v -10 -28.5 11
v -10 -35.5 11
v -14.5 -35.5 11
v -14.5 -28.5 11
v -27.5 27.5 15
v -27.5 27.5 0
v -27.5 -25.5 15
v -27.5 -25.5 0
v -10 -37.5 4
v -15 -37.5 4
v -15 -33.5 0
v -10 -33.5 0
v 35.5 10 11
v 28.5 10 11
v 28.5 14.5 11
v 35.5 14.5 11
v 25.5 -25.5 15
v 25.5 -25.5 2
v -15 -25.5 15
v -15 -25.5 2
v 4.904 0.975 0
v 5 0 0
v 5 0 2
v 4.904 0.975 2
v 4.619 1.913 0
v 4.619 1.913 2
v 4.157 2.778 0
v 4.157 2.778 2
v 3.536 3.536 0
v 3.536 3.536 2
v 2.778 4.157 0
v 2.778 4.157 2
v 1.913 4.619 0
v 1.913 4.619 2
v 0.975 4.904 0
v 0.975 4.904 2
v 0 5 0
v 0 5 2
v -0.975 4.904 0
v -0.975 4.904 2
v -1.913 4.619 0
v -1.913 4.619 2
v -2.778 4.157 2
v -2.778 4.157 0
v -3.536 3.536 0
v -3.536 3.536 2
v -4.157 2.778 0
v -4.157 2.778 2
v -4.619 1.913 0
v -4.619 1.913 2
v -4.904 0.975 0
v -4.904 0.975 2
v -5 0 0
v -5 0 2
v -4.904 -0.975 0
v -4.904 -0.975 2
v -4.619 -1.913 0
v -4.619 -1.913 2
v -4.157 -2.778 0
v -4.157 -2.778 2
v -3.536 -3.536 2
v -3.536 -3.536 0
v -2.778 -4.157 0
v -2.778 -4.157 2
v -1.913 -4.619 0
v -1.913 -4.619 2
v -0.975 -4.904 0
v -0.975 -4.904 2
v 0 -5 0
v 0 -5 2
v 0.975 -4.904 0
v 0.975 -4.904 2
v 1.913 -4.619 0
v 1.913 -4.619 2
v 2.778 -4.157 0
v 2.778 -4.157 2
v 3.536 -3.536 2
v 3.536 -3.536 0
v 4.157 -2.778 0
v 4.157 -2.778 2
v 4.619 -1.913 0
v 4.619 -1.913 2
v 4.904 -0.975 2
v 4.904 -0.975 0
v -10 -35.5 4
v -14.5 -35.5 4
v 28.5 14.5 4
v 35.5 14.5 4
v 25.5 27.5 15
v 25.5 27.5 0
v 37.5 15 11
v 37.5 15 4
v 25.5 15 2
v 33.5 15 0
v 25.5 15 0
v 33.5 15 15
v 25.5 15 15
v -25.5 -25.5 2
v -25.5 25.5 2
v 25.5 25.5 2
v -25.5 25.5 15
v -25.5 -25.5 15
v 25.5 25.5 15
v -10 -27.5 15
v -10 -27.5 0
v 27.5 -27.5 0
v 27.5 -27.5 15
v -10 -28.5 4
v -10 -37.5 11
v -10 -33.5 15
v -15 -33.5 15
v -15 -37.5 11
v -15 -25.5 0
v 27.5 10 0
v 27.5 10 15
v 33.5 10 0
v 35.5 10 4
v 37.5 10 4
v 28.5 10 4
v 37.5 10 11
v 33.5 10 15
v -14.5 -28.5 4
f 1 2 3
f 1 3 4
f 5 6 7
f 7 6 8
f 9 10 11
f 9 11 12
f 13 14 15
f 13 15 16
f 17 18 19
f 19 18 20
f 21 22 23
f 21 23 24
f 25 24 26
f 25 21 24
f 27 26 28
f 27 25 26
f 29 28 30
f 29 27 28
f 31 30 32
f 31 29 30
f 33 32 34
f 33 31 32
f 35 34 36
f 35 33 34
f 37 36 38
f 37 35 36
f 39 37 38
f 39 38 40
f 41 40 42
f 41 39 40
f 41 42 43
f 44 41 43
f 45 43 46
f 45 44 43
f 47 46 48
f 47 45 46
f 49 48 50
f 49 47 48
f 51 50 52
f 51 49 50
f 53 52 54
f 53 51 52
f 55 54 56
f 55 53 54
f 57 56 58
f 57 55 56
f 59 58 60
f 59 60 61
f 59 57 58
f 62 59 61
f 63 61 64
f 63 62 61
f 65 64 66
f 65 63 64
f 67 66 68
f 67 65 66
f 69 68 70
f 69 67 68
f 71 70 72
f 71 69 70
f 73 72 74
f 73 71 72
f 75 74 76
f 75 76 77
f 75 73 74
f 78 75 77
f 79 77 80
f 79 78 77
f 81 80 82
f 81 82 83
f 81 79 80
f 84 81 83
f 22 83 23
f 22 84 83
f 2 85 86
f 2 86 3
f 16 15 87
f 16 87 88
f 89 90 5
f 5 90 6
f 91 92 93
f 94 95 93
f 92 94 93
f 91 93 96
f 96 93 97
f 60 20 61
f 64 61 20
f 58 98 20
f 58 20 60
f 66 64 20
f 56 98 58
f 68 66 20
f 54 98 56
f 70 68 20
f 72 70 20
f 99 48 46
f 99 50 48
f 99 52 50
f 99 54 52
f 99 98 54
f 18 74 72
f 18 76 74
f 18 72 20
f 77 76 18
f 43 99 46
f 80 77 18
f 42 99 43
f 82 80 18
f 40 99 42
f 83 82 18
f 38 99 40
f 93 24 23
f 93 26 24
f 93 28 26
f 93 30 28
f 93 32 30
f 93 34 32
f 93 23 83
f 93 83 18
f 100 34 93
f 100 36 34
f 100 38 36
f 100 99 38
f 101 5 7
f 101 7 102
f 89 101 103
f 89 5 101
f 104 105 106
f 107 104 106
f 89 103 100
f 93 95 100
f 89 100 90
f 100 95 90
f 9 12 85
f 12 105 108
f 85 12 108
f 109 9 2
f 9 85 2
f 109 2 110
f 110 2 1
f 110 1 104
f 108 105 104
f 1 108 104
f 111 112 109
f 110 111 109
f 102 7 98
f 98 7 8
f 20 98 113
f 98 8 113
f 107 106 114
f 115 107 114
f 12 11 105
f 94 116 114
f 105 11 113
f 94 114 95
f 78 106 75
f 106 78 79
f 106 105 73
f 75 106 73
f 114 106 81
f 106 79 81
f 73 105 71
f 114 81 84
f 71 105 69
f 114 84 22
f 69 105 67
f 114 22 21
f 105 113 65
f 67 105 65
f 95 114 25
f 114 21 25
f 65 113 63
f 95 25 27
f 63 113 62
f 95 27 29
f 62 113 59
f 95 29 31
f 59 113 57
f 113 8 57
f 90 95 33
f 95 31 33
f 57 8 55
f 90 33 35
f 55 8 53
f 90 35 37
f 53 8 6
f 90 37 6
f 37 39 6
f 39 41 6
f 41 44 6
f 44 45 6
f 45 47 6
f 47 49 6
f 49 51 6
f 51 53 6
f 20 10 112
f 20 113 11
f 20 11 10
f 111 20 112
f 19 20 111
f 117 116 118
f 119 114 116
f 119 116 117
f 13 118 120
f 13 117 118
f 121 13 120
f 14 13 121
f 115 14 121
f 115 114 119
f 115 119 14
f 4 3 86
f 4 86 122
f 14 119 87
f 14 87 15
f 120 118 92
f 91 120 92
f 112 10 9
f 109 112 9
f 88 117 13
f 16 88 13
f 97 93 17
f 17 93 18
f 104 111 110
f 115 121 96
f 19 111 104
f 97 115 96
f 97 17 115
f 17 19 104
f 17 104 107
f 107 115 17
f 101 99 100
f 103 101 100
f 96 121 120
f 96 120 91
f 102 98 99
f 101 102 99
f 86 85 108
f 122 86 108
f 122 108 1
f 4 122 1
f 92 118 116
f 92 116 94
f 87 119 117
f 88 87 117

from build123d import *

# Parameters (mm, degrees)
F0_R      = 5
F1_DEPTH  = 2
F2_DEPTH  = 15
F3_W      = 5
F3_H      = 15
F4_DEPTH  = 10
F5_SIZE   = 4
F6_W      = 7
F6_H      = 7
F7_DEPTH  = 4.5
F8_W      = 5
F8_H      = 15
F9_DEPTH  = 10
F10_W     = 7
F10_H     = 7
F11_DEPTH = 4.5
F12_SIZE  = 4


with BuildPart() as f1:
    # F0 (on Top) → F1 (new body)
    with BuildSketch(Plane.XY):
        Polygon((25.5, 17.5), (25.5, 25.5), (-25.5, 25.5), (-25.5, -25.5), (-17.5, -25.5), (-15, -25.5), (25.5, -25.5), (25.5, 15), align=None)
        Circle(F0_R, mode=Mode.SUBTRACT)
    extrude(amount=F1_DEPTH)

    # F0 (on Top) → F2 (join)
    with BuildSketch(Plane.XY):
        Polygon((25.5, 27.5), (-27.5, 27.5), (-27.5, -25.5), (-25.5, -25.5), (-25.5, 25.5), (25.5, 25.5), align=None)
        Polygon((27.5, -27.5), (27.5, 15), (25.5, 15), (25.5, -25.5), (-15, -25.5), (-15, -27.5), align=None)
    extrude(amount=F2_DEPTH)

    # F3 (on face) → F4 (join)
    with BuildSketch(Plane.XZ.offset(27.5)):
        with Locations((-12.5, 7.5)):
            Rectangle(F3_W, F3_H)
    extrude(amount=F4_DEPTH)

    # F5
    f5_edges = [f1.edges().sort_by_distance(p)[0] for p in [
        (-12.5, -37.5, 15),
        (-12.5, -37.5, 0),
    ]]
    chamfer(f5_edges, length=F5_SIZE)

    # F6 (on face) → F7 (cut)
    with BuildSketch(Plane.YZ.offset(-10)):
        with Locations((-32, 7.5)):
            Rectangle(F6_W, F6_H)
    extrude(amount=-F7_DEPTH, mode=Mode.SUBTRACT)

    # F8 (on face) → F9 (join)
    with BuildSketch(Plane.YZ.offset(27.5)):
        with Locations((12.5, 7.5)):
            Rectangle(F8_W, F8_H)
    extrude(amount=F9_DEPTH)

    # F10 (on face) → F11 (cut)
    with BuildSketch(Plane.XZ.offset(-10)):
        with Locations((32, 7.5)):
            Rectangle(F10_W, F10_H)
    extrude(amount=-F11_DEPTH, mode=Mode.SUBTRACT)

    # F12
    f12_edges = [f1.edges().sort_by_distance(p)[0] for p in [
        (37.5, 12.5, 15),
        (37.5, 12.5, 0),
    ]]
    chamfer(f12_edges, length=F12_SIZE)


solid = f1.part
